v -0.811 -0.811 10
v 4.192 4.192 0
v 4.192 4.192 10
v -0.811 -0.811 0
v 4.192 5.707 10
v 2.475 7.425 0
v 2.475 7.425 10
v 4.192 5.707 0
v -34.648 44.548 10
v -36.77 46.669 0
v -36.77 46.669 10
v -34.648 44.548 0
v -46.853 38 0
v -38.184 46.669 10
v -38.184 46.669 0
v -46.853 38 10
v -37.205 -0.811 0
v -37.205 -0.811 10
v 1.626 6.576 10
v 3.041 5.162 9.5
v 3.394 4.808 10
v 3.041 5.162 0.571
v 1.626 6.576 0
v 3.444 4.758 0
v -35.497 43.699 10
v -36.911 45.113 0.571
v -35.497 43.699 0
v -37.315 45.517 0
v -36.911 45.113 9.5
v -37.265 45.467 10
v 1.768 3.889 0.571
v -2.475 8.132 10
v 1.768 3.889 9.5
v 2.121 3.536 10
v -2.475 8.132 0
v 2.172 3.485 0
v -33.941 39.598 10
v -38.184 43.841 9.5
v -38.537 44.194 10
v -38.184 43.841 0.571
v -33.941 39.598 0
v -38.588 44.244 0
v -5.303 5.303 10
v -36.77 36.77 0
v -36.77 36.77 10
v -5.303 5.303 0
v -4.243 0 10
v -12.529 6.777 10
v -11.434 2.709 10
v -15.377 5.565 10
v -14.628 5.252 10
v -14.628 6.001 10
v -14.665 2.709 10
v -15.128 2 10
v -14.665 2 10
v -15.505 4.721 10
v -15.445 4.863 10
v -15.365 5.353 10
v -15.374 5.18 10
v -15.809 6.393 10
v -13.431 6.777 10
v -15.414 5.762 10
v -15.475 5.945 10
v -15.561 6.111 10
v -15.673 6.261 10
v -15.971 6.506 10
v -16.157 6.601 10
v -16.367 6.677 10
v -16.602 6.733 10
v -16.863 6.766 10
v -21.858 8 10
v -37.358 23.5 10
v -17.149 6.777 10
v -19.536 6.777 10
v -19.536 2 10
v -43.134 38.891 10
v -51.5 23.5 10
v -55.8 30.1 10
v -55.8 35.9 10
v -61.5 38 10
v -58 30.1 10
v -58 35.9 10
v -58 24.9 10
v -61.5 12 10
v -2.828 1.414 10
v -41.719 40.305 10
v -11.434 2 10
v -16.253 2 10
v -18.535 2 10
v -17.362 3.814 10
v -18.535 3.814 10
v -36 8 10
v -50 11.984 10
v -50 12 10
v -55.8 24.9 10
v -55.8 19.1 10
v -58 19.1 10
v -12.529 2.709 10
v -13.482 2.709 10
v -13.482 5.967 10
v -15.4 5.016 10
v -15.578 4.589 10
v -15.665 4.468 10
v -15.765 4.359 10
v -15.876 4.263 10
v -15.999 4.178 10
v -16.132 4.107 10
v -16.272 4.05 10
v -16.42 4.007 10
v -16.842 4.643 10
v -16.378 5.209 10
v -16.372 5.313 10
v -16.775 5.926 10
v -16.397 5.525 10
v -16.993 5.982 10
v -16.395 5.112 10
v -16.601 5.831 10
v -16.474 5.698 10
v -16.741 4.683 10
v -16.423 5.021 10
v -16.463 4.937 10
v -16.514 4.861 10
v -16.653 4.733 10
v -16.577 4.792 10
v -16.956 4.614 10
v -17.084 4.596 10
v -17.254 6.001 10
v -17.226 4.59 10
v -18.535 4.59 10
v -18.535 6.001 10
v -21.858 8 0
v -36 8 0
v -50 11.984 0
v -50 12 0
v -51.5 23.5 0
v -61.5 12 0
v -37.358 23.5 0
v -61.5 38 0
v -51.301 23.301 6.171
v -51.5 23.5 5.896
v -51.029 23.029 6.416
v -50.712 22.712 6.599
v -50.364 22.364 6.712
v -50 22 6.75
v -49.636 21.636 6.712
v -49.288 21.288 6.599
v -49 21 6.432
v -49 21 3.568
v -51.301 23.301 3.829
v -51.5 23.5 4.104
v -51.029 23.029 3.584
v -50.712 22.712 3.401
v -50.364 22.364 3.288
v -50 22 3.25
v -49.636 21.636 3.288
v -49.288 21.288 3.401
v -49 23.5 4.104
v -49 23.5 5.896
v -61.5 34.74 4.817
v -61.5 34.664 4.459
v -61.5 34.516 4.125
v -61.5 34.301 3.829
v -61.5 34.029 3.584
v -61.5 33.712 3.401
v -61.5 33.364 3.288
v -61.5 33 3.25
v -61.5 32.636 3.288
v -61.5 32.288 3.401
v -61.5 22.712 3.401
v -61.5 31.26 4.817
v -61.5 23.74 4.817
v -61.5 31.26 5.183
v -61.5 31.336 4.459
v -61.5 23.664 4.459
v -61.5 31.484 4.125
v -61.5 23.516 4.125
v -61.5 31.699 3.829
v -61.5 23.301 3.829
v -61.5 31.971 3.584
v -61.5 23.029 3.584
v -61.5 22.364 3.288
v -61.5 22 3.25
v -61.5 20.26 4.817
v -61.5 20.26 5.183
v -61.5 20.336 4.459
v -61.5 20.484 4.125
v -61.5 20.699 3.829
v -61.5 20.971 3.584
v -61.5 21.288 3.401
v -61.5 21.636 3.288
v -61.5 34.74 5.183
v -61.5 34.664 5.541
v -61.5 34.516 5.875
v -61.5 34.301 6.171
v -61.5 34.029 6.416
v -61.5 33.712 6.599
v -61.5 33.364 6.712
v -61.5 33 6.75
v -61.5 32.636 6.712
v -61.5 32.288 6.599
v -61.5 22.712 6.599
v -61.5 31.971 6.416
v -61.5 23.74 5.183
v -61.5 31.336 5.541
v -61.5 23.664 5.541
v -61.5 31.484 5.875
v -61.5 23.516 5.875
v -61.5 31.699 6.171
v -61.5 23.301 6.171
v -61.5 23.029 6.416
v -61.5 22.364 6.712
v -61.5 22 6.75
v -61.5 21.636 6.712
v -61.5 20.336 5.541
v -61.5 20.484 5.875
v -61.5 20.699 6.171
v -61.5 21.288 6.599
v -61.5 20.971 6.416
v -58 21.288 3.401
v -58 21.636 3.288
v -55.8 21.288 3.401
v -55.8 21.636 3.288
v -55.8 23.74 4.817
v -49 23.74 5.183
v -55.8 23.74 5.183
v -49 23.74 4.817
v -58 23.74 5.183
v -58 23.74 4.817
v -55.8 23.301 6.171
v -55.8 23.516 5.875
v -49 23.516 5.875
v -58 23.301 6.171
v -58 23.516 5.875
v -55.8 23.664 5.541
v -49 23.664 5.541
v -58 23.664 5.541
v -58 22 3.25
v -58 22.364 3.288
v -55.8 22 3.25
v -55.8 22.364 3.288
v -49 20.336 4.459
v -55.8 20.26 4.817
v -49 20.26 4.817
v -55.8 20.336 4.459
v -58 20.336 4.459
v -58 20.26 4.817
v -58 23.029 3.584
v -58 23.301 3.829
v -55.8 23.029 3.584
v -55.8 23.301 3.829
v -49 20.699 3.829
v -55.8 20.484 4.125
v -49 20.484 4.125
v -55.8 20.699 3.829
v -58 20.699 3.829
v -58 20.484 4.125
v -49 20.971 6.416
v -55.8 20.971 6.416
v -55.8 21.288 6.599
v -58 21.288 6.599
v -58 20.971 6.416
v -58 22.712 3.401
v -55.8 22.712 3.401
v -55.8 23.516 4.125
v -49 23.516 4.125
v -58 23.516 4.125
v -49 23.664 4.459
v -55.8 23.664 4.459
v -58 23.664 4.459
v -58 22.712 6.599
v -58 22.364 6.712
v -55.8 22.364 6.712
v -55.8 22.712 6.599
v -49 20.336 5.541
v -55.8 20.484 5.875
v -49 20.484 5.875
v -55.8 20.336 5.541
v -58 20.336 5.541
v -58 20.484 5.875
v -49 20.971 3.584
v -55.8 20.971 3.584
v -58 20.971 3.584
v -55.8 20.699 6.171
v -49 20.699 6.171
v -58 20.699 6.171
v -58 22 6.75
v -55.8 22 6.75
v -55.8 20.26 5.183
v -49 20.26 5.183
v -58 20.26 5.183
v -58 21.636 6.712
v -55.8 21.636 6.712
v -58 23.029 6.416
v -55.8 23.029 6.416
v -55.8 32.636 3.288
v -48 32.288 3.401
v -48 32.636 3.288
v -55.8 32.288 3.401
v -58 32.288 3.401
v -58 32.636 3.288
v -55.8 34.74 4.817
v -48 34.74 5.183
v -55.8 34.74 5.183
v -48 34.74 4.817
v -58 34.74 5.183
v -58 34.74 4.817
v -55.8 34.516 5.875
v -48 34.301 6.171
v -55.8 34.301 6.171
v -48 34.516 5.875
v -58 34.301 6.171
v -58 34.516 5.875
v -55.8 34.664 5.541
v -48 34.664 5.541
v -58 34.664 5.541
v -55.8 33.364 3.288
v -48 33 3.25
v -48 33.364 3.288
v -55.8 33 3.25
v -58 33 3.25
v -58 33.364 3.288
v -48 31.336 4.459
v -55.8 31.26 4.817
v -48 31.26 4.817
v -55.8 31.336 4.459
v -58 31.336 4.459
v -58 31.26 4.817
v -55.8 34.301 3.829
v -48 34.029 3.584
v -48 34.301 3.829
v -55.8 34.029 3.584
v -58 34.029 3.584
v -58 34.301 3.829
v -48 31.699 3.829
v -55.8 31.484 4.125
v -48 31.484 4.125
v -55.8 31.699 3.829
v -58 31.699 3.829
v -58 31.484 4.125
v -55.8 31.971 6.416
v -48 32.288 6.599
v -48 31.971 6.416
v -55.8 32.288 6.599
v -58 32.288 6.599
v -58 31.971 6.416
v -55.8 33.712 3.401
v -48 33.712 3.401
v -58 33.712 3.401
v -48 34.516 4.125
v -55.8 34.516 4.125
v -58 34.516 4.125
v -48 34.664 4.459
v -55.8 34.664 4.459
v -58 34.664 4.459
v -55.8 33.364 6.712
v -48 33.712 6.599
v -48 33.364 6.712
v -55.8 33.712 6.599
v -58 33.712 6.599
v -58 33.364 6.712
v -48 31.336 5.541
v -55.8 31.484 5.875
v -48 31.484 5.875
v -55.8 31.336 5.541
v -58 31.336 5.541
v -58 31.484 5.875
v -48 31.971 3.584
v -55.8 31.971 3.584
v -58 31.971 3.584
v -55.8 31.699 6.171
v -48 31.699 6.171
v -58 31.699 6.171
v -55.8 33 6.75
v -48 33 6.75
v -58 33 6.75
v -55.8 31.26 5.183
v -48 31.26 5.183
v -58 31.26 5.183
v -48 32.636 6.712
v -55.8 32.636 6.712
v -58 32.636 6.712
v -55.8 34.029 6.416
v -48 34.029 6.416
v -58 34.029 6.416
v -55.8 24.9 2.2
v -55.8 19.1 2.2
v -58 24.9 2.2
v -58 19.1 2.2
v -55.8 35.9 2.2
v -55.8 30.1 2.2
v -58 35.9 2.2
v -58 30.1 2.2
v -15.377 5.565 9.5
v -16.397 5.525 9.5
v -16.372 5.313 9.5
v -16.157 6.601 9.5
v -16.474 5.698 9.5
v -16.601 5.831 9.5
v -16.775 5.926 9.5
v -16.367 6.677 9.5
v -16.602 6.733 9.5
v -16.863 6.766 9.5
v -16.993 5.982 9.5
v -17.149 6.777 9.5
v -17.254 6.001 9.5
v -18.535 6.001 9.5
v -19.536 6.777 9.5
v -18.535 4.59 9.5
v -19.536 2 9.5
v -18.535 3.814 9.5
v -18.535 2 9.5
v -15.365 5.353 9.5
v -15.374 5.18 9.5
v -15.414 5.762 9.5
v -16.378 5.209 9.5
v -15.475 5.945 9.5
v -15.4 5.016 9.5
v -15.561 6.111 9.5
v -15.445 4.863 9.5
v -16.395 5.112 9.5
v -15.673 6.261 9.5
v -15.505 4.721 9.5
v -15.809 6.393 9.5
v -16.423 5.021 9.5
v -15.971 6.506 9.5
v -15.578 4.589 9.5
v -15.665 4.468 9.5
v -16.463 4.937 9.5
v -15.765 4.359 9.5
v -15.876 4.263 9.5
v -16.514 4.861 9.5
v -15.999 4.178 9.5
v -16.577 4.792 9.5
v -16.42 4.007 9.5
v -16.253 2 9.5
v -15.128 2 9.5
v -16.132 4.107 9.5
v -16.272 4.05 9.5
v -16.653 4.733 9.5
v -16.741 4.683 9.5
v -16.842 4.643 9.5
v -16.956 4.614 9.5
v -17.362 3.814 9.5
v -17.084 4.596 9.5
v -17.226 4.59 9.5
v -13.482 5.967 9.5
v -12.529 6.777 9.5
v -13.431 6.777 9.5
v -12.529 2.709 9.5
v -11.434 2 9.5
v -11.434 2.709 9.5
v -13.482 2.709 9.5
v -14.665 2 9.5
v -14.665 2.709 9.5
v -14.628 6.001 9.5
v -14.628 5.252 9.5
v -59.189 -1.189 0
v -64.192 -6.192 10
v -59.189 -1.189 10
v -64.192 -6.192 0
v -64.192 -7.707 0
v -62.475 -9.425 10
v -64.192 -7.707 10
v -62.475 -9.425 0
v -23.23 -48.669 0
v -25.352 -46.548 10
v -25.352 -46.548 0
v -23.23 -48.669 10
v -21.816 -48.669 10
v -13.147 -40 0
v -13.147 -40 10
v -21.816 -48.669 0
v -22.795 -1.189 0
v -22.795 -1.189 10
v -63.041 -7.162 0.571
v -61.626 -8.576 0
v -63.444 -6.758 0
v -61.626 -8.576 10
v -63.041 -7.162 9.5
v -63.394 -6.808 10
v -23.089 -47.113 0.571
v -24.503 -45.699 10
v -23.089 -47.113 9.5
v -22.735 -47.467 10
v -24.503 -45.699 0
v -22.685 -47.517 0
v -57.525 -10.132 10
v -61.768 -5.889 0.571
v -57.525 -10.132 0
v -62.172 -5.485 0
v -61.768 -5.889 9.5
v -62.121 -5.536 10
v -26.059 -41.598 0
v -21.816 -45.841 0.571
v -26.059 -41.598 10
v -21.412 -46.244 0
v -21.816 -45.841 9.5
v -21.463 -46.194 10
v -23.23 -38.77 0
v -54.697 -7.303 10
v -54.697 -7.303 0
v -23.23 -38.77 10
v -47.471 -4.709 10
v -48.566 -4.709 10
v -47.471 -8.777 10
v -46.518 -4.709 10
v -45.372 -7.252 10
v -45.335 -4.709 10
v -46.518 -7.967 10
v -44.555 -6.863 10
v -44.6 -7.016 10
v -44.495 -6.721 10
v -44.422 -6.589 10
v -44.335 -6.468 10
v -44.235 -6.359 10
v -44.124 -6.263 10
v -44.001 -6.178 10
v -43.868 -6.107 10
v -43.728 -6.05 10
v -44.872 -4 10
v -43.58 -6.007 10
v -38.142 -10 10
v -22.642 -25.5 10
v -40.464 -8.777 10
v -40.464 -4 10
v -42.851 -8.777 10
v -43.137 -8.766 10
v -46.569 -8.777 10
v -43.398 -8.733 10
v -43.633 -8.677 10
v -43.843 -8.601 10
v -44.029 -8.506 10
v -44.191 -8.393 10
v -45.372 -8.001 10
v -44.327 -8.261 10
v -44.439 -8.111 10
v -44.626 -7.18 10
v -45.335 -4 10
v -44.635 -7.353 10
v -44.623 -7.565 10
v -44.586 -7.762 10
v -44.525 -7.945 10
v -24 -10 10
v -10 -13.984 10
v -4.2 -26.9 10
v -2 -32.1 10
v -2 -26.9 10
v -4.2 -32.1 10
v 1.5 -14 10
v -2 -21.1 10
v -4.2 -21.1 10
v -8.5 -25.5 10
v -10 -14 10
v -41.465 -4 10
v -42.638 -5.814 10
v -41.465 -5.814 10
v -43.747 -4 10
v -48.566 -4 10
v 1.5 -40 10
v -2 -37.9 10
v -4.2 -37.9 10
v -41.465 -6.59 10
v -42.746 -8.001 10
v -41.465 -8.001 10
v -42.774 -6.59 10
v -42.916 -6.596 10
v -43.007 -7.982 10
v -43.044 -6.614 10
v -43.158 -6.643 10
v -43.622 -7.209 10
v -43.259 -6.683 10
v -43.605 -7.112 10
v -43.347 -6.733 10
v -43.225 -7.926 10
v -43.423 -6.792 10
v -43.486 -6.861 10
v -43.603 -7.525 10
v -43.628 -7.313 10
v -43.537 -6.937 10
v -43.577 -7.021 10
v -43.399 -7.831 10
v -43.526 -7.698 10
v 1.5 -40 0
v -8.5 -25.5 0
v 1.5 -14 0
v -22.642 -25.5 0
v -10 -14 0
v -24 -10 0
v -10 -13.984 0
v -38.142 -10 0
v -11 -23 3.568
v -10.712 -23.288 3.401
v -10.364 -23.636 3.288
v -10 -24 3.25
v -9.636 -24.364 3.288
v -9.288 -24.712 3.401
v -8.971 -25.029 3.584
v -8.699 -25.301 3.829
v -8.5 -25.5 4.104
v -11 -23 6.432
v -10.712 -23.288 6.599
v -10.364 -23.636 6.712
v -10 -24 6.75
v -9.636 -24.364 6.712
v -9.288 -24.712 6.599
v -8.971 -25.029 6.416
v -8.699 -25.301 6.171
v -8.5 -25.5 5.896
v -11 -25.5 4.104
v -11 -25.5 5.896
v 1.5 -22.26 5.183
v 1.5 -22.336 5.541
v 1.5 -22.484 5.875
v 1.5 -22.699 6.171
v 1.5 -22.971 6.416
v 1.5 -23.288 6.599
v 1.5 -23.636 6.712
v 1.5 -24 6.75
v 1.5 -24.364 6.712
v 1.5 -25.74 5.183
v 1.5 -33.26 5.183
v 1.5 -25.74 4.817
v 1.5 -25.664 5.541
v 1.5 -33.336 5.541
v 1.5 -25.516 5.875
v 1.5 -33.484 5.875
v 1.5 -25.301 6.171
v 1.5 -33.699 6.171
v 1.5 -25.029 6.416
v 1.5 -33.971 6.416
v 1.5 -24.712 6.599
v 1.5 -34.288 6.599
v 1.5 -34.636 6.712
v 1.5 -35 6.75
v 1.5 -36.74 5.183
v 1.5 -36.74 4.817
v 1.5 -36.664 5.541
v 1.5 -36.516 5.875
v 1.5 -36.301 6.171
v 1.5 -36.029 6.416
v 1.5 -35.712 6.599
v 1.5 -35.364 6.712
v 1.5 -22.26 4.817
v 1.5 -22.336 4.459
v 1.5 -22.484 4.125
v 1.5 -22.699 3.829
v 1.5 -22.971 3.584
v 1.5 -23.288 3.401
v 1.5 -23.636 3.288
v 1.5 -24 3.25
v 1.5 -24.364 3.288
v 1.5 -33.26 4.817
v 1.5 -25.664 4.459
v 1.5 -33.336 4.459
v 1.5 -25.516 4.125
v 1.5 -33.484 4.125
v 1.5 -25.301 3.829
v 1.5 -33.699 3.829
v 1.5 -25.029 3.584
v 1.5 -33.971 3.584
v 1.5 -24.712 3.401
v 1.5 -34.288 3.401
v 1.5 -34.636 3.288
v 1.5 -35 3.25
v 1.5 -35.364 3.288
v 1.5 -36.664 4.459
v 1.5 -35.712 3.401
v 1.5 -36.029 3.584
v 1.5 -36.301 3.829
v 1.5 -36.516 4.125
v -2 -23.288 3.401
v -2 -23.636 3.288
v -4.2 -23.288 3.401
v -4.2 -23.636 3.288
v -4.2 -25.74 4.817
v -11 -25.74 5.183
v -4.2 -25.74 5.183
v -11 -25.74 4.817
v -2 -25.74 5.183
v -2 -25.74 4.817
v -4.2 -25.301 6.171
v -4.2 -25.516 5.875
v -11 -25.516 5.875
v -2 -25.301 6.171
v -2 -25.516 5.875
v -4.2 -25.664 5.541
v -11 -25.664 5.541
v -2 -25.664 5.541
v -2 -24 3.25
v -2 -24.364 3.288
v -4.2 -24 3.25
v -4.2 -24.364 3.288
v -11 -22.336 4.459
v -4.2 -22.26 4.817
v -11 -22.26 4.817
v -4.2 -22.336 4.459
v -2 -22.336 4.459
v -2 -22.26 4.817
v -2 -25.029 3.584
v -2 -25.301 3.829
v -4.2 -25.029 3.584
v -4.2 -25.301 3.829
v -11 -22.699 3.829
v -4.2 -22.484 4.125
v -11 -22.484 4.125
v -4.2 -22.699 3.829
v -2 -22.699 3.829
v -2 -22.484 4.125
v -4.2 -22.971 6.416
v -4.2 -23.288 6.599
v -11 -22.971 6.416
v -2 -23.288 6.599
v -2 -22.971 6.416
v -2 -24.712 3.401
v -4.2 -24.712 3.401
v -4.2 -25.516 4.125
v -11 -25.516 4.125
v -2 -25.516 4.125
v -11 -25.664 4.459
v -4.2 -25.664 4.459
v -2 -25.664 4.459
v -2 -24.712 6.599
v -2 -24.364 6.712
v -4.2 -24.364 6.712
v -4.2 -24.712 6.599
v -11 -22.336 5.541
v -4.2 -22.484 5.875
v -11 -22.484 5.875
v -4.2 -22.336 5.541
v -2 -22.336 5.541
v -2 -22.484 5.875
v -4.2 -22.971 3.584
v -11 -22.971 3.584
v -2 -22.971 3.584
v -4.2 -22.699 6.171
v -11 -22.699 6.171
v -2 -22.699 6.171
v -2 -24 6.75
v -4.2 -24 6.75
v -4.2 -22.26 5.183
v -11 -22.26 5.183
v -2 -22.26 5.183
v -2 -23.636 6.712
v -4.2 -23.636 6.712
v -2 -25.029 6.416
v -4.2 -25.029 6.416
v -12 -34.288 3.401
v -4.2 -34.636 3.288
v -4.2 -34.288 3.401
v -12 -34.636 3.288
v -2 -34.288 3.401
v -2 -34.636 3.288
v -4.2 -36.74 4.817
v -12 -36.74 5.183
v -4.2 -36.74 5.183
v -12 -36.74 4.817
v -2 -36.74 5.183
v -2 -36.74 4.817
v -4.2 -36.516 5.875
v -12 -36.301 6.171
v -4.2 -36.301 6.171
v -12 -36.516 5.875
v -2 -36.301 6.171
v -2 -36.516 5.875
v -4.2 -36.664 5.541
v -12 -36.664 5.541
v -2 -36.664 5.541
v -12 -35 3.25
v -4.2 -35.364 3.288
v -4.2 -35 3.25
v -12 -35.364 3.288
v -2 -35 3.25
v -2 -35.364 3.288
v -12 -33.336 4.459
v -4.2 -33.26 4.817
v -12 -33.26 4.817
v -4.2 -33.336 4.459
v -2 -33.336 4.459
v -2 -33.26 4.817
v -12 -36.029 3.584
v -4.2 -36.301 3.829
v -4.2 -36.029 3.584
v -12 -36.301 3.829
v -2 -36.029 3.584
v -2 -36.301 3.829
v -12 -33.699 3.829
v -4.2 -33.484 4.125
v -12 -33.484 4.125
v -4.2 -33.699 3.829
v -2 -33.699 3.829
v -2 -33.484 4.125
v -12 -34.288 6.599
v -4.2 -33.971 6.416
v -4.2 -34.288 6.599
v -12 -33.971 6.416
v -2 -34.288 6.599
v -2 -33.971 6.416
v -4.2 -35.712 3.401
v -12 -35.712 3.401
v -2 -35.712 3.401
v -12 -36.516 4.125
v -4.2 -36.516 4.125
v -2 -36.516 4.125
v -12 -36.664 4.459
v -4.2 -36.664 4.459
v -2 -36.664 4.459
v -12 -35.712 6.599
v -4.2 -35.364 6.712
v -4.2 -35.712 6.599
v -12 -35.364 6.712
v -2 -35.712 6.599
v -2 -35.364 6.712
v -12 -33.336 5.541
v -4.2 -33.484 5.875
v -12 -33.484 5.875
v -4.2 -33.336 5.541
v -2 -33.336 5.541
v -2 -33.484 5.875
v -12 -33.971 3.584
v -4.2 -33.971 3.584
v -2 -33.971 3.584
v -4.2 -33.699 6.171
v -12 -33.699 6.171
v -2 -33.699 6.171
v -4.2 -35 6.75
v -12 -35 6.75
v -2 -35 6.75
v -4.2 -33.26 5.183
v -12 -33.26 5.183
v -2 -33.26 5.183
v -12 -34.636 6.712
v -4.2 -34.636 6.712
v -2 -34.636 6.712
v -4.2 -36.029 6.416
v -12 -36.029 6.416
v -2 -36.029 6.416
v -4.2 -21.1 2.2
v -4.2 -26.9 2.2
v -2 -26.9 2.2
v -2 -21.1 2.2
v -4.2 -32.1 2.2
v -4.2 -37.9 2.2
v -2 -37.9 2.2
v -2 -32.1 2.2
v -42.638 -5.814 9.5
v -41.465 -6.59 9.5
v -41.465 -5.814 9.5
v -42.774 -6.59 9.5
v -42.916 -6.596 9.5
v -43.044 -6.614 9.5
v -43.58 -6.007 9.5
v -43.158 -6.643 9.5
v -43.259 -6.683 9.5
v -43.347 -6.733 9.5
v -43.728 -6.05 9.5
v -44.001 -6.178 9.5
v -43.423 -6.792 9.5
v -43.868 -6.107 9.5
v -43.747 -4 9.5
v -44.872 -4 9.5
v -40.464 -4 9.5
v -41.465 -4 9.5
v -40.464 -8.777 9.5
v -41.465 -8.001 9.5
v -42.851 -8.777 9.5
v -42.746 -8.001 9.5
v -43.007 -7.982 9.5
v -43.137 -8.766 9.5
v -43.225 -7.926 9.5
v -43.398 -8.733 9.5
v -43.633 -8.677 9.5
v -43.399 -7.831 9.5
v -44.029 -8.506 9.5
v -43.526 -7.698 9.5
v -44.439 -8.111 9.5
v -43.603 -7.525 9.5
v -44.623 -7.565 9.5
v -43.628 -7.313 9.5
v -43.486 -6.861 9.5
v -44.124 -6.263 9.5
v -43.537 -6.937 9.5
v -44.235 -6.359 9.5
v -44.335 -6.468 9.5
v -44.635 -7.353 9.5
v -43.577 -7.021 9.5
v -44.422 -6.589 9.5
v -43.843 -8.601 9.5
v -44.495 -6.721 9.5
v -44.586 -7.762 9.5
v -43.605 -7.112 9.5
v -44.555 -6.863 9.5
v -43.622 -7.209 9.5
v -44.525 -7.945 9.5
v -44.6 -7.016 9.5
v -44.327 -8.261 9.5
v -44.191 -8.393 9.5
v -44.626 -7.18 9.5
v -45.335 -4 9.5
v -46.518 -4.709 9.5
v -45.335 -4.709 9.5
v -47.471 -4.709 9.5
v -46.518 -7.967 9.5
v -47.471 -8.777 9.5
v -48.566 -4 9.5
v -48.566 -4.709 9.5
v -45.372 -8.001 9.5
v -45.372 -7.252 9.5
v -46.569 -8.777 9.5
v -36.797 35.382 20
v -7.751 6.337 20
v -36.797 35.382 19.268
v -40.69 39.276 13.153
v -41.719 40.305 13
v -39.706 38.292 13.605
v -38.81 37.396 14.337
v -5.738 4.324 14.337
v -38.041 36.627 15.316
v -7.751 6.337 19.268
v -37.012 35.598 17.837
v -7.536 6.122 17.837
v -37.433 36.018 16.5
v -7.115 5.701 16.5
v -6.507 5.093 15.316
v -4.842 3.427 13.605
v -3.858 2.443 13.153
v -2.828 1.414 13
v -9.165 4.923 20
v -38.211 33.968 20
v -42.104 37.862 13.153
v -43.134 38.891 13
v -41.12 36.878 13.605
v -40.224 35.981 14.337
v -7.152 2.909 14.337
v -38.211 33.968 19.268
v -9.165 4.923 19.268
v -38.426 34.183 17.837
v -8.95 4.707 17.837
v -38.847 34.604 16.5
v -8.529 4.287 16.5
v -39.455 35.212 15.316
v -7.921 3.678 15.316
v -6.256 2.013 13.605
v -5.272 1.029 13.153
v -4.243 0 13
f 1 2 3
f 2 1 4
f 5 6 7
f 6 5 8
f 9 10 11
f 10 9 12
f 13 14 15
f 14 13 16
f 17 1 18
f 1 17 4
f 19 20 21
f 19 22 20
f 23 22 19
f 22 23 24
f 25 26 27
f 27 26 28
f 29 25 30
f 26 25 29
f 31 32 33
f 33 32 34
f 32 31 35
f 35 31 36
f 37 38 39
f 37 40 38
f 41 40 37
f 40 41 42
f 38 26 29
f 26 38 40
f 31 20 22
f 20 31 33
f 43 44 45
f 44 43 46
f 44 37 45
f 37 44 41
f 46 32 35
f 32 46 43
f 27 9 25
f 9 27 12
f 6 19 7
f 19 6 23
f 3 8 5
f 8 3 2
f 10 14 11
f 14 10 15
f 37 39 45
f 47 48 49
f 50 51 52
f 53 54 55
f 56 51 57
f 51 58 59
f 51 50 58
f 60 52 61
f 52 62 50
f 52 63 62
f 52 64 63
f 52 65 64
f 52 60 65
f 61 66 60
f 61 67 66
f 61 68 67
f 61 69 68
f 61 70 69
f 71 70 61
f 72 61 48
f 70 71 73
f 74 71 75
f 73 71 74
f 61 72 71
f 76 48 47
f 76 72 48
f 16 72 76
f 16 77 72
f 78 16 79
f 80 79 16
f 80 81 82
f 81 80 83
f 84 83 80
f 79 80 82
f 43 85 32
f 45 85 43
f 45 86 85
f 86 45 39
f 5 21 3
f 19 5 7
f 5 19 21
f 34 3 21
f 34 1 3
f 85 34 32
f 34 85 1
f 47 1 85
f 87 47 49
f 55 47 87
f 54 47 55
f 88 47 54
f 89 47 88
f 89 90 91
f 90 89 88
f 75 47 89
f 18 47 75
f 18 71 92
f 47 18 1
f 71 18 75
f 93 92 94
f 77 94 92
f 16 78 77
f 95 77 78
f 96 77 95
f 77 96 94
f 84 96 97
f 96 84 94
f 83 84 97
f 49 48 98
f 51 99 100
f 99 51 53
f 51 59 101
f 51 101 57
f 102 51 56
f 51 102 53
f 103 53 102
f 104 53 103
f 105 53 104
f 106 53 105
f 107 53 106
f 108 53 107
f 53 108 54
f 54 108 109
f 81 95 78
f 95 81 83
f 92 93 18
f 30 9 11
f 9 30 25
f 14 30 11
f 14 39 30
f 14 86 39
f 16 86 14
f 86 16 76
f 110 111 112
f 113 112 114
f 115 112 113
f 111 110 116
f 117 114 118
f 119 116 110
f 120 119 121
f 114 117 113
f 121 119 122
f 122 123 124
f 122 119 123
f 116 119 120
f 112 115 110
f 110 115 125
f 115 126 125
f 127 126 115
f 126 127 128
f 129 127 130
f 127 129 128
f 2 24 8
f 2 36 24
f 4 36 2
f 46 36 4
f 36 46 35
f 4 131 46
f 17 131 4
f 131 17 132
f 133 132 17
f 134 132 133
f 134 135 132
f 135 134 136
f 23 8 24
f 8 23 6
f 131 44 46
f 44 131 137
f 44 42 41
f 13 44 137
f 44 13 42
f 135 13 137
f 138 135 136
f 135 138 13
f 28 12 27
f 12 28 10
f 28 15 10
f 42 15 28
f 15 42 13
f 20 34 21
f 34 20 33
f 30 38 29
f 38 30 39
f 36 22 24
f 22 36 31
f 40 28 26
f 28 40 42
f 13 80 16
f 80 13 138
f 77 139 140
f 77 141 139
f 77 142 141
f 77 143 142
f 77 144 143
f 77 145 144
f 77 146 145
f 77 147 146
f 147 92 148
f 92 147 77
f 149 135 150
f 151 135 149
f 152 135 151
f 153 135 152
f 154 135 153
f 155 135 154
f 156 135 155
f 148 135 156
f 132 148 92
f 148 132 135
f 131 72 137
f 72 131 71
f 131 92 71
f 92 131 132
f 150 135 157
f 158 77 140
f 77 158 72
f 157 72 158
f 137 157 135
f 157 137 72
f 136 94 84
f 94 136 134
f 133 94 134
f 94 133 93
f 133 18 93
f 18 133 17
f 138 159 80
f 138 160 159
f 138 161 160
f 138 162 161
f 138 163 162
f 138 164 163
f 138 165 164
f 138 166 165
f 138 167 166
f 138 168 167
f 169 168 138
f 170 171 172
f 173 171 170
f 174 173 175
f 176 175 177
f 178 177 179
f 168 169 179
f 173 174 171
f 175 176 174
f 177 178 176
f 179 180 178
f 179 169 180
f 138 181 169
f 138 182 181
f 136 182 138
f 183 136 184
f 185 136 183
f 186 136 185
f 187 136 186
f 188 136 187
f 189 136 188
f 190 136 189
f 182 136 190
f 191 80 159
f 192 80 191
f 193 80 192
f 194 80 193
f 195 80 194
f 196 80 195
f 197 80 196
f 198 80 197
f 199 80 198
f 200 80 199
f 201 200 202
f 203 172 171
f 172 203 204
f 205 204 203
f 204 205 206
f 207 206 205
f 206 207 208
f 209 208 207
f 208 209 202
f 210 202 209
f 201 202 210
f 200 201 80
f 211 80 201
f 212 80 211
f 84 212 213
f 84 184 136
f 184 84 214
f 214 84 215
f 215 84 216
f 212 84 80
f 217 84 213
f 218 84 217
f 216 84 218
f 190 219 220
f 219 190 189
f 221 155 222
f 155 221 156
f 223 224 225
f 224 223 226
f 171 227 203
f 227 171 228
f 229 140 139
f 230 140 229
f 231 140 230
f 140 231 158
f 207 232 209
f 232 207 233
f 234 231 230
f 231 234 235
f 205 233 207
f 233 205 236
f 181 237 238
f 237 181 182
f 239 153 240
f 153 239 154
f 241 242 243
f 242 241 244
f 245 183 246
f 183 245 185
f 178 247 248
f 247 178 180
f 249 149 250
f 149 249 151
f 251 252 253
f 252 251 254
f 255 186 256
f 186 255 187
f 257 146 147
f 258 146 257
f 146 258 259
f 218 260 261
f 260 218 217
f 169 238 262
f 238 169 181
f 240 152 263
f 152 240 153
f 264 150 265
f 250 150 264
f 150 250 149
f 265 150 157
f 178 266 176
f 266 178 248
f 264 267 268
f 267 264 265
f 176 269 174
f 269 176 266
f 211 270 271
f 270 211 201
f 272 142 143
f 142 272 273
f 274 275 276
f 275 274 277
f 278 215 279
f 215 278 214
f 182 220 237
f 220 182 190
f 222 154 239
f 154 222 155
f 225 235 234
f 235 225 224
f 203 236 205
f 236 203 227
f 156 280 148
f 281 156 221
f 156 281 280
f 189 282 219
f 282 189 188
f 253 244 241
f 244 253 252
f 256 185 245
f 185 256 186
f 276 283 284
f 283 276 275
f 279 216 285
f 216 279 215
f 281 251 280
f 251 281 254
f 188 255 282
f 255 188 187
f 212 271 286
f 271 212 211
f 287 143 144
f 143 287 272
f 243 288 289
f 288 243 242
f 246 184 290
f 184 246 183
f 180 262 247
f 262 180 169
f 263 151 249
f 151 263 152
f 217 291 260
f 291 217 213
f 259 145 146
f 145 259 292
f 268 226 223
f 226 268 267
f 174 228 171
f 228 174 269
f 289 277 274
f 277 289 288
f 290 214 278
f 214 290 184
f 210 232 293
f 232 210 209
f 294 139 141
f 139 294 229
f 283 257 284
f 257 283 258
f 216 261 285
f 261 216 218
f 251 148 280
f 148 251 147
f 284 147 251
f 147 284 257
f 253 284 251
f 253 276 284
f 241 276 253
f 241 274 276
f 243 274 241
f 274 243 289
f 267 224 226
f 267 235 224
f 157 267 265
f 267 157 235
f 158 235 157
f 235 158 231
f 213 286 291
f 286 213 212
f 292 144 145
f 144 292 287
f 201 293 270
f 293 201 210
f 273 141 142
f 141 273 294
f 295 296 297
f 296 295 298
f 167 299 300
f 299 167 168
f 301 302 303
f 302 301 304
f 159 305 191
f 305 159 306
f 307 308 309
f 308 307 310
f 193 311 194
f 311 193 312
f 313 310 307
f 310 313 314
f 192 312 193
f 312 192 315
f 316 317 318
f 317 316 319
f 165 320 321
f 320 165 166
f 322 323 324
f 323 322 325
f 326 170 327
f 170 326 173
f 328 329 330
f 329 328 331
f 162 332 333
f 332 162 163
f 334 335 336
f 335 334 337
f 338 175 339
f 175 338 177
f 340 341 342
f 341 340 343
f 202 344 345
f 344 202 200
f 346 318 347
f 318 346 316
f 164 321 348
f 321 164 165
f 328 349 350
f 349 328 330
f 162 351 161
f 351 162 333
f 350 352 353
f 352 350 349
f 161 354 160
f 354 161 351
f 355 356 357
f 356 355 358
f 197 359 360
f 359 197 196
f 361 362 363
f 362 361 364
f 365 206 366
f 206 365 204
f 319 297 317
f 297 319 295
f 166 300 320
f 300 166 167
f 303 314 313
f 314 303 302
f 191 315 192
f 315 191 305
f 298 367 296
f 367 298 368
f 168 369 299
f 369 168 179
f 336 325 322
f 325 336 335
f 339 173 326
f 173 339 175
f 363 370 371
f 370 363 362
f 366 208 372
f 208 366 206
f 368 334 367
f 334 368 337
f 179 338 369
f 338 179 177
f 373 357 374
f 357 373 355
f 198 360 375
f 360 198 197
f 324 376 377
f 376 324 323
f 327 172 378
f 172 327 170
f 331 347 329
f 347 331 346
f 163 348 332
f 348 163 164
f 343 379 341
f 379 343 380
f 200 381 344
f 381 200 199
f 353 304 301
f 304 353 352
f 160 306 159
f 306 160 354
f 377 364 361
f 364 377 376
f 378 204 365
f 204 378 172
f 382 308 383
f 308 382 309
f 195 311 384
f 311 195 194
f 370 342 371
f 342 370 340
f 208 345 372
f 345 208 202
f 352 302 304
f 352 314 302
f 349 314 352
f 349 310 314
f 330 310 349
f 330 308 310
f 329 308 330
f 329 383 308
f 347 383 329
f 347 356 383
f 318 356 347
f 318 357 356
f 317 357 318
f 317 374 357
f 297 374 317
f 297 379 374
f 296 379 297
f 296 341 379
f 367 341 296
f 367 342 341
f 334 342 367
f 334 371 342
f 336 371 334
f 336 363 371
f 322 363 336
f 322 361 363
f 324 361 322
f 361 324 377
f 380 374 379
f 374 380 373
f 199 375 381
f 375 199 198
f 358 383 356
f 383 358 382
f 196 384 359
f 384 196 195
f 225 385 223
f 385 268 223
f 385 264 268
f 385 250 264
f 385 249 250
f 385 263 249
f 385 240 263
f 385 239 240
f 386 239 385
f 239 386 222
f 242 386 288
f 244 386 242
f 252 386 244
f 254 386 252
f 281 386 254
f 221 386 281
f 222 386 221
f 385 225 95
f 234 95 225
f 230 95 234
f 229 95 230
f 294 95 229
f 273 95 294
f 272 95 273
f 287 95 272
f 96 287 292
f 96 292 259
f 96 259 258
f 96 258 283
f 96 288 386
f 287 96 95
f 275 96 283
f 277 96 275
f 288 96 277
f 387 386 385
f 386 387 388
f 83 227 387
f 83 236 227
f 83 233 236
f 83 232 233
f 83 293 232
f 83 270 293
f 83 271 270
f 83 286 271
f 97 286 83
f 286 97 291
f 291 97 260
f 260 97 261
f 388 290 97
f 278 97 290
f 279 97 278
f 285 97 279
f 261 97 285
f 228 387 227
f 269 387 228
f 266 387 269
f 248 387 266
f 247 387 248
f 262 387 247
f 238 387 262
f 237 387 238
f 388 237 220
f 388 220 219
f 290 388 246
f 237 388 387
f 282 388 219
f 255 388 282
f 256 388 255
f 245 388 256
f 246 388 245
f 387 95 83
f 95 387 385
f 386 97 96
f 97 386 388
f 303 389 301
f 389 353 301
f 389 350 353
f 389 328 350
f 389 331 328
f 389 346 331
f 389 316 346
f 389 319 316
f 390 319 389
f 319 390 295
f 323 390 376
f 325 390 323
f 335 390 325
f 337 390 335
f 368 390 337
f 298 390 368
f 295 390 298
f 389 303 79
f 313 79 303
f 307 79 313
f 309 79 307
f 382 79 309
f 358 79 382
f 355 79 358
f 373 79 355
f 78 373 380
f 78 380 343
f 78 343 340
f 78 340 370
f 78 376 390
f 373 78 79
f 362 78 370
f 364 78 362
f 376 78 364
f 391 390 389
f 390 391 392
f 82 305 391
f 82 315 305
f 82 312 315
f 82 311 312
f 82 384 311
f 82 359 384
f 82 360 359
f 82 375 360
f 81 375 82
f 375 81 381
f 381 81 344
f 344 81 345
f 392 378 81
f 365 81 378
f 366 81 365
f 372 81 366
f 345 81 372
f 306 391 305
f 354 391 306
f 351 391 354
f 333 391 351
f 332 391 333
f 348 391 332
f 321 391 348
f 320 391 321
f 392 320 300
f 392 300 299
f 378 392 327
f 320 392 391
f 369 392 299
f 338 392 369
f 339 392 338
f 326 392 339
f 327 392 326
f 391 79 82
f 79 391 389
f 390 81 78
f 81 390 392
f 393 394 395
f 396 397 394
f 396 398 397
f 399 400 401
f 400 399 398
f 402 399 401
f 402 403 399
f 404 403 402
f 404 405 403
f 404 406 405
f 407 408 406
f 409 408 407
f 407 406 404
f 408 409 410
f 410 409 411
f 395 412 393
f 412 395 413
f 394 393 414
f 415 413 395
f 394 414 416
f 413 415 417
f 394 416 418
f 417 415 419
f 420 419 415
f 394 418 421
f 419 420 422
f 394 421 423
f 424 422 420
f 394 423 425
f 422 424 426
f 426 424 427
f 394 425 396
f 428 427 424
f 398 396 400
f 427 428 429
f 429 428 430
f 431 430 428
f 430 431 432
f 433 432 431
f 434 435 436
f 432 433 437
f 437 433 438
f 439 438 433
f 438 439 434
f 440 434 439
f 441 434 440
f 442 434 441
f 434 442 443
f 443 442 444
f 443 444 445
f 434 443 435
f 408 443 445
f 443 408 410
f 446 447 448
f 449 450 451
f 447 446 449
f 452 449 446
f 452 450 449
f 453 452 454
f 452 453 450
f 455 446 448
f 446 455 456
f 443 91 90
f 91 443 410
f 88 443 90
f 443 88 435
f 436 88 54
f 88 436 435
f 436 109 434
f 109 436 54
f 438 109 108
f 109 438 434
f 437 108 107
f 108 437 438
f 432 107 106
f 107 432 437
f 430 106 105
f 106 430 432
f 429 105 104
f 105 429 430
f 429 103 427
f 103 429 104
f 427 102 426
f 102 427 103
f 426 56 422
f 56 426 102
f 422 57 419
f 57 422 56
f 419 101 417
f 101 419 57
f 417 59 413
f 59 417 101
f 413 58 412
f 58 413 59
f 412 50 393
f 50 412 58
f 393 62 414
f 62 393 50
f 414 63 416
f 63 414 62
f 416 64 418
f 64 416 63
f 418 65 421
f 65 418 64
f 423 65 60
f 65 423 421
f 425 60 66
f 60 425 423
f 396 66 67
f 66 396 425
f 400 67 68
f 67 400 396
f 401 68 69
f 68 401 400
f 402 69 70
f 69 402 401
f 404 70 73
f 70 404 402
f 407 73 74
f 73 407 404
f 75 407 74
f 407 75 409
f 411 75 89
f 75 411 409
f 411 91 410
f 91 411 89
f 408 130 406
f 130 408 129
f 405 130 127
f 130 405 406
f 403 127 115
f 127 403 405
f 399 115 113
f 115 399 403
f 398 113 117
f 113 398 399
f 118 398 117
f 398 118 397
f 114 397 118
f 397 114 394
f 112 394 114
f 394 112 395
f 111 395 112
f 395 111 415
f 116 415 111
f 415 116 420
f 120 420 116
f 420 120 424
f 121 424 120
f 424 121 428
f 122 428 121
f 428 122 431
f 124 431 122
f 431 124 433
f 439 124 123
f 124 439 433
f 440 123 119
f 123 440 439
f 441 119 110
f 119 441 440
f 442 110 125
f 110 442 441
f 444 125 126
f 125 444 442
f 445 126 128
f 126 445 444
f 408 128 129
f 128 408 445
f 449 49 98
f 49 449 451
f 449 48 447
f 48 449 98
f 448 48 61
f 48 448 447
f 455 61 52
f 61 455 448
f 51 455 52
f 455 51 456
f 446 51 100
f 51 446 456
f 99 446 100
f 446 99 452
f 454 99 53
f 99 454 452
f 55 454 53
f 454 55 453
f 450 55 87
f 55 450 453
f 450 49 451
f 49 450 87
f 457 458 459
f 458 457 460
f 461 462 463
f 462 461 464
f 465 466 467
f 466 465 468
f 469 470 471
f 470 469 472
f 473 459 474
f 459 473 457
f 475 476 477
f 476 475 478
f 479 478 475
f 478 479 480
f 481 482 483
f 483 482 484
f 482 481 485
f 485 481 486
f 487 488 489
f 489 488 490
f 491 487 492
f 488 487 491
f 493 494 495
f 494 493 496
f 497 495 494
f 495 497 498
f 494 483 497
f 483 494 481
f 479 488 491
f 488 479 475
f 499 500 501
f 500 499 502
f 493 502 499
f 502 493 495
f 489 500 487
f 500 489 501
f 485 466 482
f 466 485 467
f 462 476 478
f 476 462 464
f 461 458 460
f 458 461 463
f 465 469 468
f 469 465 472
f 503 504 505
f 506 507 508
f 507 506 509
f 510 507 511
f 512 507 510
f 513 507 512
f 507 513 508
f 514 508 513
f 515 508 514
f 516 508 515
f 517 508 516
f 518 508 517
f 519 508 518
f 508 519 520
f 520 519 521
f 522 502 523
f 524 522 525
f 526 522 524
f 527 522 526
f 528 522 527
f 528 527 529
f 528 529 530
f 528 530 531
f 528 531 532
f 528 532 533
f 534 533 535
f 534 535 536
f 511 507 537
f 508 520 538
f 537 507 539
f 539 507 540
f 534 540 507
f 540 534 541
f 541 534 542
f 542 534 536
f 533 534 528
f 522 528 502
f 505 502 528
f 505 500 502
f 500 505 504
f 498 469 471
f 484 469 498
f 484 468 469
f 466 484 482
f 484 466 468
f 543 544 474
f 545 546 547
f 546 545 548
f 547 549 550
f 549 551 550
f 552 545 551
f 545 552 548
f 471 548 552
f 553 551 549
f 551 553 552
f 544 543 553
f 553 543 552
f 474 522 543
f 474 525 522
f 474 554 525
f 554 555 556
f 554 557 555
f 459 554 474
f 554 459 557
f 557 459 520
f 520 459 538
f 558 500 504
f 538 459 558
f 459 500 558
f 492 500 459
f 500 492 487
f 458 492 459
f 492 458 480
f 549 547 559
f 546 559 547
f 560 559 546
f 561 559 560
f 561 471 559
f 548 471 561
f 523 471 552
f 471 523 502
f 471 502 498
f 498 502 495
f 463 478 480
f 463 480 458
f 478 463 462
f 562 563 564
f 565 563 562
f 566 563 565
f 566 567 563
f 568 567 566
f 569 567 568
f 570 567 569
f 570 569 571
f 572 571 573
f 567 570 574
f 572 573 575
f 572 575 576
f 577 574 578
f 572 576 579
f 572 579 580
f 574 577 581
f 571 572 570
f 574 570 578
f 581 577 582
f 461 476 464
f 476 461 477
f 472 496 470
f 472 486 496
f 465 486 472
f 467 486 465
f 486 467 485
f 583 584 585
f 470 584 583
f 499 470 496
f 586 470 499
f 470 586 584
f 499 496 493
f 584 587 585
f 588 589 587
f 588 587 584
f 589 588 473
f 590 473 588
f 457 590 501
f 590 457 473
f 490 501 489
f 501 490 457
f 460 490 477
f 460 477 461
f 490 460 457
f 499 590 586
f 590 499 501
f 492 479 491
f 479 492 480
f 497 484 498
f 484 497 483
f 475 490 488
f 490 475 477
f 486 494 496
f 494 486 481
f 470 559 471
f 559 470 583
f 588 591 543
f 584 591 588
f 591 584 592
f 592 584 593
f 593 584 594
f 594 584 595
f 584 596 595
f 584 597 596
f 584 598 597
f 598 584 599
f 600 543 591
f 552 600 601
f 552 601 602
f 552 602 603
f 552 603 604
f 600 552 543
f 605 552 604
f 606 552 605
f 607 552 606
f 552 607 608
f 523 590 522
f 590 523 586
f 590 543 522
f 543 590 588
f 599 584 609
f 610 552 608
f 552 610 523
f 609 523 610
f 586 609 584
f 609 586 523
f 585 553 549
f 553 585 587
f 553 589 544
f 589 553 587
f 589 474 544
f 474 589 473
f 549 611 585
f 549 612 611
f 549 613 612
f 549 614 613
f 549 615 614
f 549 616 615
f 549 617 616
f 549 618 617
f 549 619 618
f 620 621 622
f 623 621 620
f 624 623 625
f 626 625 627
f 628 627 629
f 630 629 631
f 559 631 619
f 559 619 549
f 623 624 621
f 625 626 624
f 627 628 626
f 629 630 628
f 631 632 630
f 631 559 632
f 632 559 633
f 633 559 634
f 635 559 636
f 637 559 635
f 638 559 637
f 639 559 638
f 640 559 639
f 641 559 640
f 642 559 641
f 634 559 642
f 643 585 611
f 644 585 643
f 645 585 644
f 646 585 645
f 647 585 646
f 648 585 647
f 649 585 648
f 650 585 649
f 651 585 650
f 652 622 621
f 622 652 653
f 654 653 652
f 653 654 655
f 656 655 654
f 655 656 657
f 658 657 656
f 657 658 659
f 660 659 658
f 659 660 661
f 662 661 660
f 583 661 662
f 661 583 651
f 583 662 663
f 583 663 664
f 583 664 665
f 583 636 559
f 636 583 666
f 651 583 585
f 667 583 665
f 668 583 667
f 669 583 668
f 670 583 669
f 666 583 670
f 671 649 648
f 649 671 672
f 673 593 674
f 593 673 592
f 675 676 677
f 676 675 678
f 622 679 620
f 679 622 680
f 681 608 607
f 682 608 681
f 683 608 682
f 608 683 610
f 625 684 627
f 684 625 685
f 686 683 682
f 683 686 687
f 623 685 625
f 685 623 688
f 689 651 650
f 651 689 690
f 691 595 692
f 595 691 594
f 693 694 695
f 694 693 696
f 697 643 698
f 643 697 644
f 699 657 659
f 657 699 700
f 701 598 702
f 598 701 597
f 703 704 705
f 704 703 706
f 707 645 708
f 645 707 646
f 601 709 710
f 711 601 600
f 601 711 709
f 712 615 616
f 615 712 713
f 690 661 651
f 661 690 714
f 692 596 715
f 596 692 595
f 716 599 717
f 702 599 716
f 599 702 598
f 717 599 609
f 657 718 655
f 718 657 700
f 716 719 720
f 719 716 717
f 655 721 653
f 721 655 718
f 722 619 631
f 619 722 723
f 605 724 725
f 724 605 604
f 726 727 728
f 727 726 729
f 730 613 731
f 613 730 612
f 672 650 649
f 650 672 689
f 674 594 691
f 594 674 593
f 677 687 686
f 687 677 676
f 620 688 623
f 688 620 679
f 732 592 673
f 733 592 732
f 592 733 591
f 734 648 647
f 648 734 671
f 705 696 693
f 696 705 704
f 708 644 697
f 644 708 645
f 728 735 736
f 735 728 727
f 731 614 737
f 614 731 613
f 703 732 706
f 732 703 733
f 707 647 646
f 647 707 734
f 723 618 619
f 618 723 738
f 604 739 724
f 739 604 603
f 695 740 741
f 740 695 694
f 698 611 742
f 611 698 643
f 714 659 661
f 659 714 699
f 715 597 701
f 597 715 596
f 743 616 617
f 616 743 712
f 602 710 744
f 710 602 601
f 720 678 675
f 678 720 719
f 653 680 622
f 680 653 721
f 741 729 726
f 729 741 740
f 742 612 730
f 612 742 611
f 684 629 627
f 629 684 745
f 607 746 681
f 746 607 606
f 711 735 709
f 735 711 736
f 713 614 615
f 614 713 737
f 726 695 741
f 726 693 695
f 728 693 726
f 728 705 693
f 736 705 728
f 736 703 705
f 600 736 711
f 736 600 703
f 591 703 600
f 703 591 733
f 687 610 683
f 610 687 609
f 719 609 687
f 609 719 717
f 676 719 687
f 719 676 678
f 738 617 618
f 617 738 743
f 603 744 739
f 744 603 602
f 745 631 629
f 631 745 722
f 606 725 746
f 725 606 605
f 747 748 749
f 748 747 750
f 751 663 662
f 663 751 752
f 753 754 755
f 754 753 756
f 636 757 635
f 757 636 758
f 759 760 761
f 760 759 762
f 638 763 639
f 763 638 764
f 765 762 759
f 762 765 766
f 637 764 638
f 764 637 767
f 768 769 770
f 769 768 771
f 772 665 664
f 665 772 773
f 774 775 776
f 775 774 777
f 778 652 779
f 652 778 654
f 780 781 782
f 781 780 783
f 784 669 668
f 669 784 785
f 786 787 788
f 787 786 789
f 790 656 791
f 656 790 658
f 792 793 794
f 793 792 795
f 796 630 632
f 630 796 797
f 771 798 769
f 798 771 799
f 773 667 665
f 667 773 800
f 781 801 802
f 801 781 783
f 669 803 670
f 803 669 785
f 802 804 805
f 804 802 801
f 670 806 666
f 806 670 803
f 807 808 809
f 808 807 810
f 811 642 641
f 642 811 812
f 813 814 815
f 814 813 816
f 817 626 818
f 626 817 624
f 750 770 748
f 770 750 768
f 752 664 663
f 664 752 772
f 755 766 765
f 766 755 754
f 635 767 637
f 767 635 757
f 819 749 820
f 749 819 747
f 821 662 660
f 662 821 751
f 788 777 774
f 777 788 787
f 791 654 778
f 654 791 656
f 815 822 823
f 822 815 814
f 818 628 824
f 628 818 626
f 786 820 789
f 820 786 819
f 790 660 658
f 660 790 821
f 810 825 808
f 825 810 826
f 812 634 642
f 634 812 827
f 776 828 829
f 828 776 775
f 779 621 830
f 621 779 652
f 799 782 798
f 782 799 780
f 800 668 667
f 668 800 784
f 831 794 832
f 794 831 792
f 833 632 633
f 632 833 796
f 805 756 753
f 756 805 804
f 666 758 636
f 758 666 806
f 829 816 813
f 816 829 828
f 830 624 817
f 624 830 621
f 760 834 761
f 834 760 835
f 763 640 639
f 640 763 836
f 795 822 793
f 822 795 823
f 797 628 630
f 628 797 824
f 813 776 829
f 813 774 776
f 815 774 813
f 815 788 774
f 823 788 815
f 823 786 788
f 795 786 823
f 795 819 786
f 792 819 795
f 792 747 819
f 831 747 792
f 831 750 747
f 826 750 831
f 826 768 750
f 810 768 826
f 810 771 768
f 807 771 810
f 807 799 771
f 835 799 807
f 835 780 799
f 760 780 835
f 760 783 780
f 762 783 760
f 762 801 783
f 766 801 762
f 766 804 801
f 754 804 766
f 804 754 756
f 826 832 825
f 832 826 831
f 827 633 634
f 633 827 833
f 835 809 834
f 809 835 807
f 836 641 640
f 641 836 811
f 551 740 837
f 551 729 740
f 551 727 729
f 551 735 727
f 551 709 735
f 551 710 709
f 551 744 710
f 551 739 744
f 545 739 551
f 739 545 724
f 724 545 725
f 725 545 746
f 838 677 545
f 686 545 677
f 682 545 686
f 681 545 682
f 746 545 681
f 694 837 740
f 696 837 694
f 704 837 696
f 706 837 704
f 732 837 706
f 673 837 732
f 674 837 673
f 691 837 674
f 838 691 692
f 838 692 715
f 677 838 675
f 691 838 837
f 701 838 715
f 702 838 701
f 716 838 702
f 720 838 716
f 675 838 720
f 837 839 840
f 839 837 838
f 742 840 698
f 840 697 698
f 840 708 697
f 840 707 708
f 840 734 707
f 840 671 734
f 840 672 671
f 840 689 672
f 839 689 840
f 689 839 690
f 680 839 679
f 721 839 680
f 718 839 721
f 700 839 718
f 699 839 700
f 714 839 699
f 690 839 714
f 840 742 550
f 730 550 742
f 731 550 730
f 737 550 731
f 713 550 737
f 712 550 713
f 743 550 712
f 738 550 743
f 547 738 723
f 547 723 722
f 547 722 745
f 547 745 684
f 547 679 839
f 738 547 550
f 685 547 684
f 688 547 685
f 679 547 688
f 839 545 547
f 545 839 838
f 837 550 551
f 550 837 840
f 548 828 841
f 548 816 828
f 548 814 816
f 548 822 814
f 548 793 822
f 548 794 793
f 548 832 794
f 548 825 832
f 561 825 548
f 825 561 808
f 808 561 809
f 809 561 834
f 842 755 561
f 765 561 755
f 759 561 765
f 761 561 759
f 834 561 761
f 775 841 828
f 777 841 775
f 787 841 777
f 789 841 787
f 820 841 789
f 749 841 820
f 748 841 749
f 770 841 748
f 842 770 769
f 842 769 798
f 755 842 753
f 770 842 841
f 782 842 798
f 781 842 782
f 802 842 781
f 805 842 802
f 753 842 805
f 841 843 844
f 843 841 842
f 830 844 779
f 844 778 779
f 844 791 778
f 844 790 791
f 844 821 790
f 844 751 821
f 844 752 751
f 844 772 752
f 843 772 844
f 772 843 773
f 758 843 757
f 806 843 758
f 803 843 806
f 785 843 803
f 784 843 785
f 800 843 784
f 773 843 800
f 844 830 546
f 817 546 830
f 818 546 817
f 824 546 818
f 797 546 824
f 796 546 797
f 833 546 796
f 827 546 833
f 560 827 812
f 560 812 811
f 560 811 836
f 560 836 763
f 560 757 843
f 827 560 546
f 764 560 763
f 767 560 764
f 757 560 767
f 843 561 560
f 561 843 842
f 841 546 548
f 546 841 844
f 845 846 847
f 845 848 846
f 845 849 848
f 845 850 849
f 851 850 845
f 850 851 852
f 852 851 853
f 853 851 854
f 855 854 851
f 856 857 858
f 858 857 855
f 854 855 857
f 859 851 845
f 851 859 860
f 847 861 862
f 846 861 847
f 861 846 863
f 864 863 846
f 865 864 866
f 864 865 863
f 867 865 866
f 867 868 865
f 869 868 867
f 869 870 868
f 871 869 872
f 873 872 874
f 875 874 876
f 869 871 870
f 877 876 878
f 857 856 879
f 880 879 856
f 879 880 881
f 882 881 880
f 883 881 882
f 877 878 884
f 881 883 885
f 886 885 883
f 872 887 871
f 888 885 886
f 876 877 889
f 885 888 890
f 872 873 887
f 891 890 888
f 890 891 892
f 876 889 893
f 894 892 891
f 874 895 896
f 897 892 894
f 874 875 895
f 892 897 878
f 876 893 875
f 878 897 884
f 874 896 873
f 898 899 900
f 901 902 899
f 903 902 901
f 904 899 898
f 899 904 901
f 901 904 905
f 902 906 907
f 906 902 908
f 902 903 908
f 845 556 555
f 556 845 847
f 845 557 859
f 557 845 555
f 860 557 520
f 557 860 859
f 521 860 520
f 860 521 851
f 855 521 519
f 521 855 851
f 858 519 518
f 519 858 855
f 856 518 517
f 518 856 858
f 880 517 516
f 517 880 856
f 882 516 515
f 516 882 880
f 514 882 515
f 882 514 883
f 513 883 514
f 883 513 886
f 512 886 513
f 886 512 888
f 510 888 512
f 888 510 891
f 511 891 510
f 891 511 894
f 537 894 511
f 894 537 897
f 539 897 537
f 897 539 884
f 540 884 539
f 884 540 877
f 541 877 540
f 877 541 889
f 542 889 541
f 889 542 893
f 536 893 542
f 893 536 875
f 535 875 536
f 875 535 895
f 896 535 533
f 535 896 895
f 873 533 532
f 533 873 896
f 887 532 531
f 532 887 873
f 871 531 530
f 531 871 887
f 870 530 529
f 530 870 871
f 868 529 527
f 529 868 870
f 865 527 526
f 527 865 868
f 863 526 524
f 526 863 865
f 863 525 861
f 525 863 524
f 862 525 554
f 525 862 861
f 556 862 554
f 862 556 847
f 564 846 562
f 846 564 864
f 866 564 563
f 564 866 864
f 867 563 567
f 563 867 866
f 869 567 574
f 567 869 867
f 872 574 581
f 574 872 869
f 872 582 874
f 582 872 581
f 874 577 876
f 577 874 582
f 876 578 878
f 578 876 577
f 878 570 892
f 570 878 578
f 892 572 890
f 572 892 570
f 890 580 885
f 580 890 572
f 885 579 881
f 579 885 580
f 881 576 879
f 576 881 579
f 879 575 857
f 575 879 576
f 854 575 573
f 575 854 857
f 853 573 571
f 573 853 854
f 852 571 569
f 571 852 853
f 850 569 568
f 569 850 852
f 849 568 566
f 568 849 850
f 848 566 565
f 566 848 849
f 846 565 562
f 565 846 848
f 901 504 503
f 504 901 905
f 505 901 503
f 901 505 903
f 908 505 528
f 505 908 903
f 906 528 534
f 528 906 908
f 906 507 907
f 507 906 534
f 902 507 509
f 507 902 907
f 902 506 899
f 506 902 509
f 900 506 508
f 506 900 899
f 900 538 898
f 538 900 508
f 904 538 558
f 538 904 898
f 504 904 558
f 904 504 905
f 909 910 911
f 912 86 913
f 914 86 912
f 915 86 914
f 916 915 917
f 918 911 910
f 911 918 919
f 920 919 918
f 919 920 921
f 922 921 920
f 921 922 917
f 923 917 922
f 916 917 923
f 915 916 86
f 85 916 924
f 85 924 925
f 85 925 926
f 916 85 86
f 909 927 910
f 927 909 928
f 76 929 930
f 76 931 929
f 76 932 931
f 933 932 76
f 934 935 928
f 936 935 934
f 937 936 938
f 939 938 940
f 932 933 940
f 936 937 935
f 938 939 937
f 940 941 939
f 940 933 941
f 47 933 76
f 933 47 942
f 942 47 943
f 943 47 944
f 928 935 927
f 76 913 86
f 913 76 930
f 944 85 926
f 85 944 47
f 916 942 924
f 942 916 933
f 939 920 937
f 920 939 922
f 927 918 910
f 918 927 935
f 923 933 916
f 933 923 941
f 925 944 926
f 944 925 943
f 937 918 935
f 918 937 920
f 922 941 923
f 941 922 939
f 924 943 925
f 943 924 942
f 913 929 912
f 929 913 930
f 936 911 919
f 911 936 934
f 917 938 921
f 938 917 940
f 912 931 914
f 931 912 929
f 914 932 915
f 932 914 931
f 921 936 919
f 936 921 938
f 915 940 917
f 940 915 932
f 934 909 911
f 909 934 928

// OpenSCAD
// PRUSA iteration4
// lcd supports
// GNU GPL v3
// Josef Průša <iam@josefprusa.cz> and contributors
// http://www.reprap.org/wiki/Prusa_Mendel
// http://prusamendel.org




module body()
{

    difference()
        {
        // base block
        translate([-55,-2,0]) cube([69,81,10]);

            union ()
            {
                // outer body shape
                translate([-69.6,32,-1]) rotate([0,0,45]) cube([60,53,15]);
                translate([13.7,89.7,-1]) rotate([0,0,135]) cube([60,42,15]);
                translate([-19,-9,-1]) cube([60,9,15] );
                translate([7,-3,-1]) cube([60,68,16]);
                translate([-16,60,-1]) cube([60,50,15] );
                translate([-41, -45,-1]) rotate([0,0,45]) cube([60,80,13]);

                // pcb cout out
                translate([4,1.5,-1]) cube([1.8,56.5,17]);
                translate([0,7.5,-1]) cube([5.8,44.5,17]);
                translate([4.8,3.5,-1]) cube([5.8,52.5,17]);
                translate([8,-5,-1] ) rotate([0,0,45]) cube([5,5,17]);
                translate([8,58,-1]) rotate([0,0,45]) cube([5,5,17]);
            }

            // pcb inserts
            translate([4,3,8]) rotate([45,0,0]) cube([1.8,5,5]);
            translate([4,56.5,8]) rotate([45,0,0]) cube([1.8,5,5]);
            translate([4,3,-5]) rotate([45,0,0]) cube([1.8,5,5]);
            translate([4,56.5,-5]) rotate([45,0,0]) cube([1.8,5,5]);
        }
}



module support()
{
    difference()
    {

        union()
        {
            rotate([0,0,45]) body();
            // screw block
            translate([-72,22,0])  cube([30,16,10]);
        }

        // lower angled part cut
        translate([-75,-2,-1])  cube([20,14,15]);
        translate([-70,-2,-1]) cube([20,14,15]);
        translate([-50,-16.3,-1]) rotate([0,0,45]) cube([20,20,15]);

        translate([-76.5,-2,-1]) cube([15,40,15]);

        difference()
        {
            translate([-28,0,-1]) rotate([0,0,45]) cube([10,40,15]);
            translate([-38,-12,-1]) cube([20,20,15]);
            translate([-58,23.5,-1]) cube([25,25,15]);
        }

        // screw holes
        translate([-71,18+4,5]) rotate([0,90,0]) cylinder(h=22, r=1.75, $fn=30);
        translate([-70,29+4,5]) rotate([0,90,0]) cylinder(h=22, r=1.75, $fn=30);

        // nut traps
        translate([-58,15.1+4,5-2.8]) cube([2.2,5.8,29.7]);
        translate([-58,26.1+4,5-2.8]) cube([2.2,5.8,29.7]);

        // version
        translate([-20,2,9.5]) rotate([0,0,0]) linear_extrude(height = 0.6)
        { text("R1",font = "helvetica:style=Bold", size=5, center=true); }
    }
}


module left_lcd_support()
{
    support();

    rotate([0,0,45]) difference()
    {
        // sd card shield
        translate([-3,3,10])  cube([2,55,10]);
        translate([-4,3,20]) rotate([0,90,0]) cylinder( h=4, r=7, $fn=30);
        translate([-4,58,20]) rotate([0,90,0]) cylinder( h=4, r=7, $fn=30);
    }
}

translate([-60,-2,0]) rotate([0,0,180]) support();
left_lcd_support();
